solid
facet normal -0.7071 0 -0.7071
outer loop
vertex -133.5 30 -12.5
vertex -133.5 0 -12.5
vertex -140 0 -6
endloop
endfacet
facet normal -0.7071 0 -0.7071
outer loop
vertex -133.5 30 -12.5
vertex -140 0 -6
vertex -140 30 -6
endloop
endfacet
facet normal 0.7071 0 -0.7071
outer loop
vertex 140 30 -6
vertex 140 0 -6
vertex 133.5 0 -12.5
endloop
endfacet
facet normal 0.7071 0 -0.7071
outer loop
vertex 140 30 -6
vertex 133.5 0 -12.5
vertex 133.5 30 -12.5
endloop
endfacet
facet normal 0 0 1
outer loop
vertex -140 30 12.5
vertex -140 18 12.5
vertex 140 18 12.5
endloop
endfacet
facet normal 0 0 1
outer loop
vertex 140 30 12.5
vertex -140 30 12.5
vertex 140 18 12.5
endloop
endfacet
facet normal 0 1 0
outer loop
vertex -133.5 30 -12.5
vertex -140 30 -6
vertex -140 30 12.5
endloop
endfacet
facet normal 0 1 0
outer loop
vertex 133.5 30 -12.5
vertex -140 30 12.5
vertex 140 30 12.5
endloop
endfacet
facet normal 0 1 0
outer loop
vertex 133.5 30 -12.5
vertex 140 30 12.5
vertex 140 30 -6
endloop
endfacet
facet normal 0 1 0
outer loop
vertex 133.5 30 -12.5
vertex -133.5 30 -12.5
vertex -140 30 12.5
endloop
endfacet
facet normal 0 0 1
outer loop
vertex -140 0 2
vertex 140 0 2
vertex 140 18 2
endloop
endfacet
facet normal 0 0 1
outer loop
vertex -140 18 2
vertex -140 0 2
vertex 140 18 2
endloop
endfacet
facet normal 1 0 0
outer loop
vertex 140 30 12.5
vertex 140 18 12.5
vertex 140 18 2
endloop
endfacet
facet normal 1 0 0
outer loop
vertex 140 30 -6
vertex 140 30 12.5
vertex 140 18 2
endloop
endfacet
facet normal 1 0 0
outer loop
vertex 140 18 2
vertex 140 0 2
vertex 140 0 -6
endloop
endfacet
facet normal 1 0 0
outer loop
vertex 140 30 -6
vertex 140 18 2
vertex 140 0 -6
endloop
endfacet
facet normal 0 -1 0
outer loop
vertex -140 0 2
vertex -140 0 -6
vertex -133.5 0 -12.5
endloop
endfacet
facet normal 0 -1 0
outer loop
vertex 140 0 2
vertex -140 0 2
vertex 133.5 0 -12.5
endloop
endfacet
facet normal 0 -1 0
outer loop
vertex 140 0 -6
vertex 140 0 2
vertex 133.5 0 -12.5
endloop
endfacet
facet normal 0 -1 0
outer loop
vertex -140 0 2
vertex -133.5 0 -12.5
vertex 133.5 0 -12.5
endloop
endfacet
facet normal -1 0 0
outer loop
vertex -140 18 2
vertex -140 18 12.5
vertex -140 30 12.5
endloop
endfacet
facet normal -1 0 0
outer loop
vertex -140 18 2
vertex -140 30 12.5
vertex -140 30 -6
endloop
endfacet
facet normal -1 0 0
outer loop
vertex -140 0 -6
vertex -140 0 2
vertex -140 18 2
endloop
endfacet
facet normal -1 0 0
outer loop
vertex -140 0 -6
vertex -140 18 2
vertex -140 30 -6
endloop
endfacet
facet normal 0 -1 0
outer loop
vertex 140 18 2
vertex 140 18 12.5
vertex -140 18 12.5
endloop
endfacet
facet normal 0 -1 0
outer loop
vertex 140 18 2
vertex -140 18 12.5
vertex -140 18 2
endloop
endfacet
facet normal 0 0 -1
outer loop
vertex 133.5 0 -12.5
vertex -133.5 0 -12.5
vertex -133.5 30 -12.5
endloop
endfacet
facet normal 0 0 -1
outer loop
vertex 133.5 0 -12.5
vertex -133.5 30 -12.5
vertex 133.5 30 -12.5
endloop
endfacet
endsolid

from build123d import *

# Parameters (mm, degrees)
SKETCH1_W           = 280
SKETCH1_H           = 25
BOSS_EXTRUDE1_DEPTH = 30
SKETCH2_W           = 10.5
SKETCH2_H           = 18
CUT_EXTRUDE1_DEPTH  = 300
CHAMFER1_SIZE       = 6.5


with BuildPart() as part:
    # Sketch1 → Boss-Extrude1 (new body)
    with BuildSketch(Plane(origin=(0, 0, 0), x_dir=(1, 0, 0), z_dir=(0, 1, 0))):
        Rectangle(SKETCH1_W, SKETCH1_H)
    extrude(amount=BOSS_EXTRUDE1_DEPTH)

    # Sketch2 → Cut-Extrude1 (cut)
    with BuildSketch(Plane(origin=(140, 0, 0), x_dir=(0, 0, -1), z_dir=(1, 0, 0))):
        with Locations((-7.25, 9)):
            Rectangle(SKETCH2_W, SKETCH2_H)
    extrude(amount=-CUT_EXTRUDE1_DEPTH, mode=Mode.SUBTRACT)

    # Chamfer1
    chamfer1_edges = [part.edges().sort_by_distance(p)[0] for p in [
        (-140, 15, -12.5),
        (140, 15, -12.5),
    ]]
    chamfer(chamfer1_edges, length=CHAMFER1_SIZE)


solid = part.part
